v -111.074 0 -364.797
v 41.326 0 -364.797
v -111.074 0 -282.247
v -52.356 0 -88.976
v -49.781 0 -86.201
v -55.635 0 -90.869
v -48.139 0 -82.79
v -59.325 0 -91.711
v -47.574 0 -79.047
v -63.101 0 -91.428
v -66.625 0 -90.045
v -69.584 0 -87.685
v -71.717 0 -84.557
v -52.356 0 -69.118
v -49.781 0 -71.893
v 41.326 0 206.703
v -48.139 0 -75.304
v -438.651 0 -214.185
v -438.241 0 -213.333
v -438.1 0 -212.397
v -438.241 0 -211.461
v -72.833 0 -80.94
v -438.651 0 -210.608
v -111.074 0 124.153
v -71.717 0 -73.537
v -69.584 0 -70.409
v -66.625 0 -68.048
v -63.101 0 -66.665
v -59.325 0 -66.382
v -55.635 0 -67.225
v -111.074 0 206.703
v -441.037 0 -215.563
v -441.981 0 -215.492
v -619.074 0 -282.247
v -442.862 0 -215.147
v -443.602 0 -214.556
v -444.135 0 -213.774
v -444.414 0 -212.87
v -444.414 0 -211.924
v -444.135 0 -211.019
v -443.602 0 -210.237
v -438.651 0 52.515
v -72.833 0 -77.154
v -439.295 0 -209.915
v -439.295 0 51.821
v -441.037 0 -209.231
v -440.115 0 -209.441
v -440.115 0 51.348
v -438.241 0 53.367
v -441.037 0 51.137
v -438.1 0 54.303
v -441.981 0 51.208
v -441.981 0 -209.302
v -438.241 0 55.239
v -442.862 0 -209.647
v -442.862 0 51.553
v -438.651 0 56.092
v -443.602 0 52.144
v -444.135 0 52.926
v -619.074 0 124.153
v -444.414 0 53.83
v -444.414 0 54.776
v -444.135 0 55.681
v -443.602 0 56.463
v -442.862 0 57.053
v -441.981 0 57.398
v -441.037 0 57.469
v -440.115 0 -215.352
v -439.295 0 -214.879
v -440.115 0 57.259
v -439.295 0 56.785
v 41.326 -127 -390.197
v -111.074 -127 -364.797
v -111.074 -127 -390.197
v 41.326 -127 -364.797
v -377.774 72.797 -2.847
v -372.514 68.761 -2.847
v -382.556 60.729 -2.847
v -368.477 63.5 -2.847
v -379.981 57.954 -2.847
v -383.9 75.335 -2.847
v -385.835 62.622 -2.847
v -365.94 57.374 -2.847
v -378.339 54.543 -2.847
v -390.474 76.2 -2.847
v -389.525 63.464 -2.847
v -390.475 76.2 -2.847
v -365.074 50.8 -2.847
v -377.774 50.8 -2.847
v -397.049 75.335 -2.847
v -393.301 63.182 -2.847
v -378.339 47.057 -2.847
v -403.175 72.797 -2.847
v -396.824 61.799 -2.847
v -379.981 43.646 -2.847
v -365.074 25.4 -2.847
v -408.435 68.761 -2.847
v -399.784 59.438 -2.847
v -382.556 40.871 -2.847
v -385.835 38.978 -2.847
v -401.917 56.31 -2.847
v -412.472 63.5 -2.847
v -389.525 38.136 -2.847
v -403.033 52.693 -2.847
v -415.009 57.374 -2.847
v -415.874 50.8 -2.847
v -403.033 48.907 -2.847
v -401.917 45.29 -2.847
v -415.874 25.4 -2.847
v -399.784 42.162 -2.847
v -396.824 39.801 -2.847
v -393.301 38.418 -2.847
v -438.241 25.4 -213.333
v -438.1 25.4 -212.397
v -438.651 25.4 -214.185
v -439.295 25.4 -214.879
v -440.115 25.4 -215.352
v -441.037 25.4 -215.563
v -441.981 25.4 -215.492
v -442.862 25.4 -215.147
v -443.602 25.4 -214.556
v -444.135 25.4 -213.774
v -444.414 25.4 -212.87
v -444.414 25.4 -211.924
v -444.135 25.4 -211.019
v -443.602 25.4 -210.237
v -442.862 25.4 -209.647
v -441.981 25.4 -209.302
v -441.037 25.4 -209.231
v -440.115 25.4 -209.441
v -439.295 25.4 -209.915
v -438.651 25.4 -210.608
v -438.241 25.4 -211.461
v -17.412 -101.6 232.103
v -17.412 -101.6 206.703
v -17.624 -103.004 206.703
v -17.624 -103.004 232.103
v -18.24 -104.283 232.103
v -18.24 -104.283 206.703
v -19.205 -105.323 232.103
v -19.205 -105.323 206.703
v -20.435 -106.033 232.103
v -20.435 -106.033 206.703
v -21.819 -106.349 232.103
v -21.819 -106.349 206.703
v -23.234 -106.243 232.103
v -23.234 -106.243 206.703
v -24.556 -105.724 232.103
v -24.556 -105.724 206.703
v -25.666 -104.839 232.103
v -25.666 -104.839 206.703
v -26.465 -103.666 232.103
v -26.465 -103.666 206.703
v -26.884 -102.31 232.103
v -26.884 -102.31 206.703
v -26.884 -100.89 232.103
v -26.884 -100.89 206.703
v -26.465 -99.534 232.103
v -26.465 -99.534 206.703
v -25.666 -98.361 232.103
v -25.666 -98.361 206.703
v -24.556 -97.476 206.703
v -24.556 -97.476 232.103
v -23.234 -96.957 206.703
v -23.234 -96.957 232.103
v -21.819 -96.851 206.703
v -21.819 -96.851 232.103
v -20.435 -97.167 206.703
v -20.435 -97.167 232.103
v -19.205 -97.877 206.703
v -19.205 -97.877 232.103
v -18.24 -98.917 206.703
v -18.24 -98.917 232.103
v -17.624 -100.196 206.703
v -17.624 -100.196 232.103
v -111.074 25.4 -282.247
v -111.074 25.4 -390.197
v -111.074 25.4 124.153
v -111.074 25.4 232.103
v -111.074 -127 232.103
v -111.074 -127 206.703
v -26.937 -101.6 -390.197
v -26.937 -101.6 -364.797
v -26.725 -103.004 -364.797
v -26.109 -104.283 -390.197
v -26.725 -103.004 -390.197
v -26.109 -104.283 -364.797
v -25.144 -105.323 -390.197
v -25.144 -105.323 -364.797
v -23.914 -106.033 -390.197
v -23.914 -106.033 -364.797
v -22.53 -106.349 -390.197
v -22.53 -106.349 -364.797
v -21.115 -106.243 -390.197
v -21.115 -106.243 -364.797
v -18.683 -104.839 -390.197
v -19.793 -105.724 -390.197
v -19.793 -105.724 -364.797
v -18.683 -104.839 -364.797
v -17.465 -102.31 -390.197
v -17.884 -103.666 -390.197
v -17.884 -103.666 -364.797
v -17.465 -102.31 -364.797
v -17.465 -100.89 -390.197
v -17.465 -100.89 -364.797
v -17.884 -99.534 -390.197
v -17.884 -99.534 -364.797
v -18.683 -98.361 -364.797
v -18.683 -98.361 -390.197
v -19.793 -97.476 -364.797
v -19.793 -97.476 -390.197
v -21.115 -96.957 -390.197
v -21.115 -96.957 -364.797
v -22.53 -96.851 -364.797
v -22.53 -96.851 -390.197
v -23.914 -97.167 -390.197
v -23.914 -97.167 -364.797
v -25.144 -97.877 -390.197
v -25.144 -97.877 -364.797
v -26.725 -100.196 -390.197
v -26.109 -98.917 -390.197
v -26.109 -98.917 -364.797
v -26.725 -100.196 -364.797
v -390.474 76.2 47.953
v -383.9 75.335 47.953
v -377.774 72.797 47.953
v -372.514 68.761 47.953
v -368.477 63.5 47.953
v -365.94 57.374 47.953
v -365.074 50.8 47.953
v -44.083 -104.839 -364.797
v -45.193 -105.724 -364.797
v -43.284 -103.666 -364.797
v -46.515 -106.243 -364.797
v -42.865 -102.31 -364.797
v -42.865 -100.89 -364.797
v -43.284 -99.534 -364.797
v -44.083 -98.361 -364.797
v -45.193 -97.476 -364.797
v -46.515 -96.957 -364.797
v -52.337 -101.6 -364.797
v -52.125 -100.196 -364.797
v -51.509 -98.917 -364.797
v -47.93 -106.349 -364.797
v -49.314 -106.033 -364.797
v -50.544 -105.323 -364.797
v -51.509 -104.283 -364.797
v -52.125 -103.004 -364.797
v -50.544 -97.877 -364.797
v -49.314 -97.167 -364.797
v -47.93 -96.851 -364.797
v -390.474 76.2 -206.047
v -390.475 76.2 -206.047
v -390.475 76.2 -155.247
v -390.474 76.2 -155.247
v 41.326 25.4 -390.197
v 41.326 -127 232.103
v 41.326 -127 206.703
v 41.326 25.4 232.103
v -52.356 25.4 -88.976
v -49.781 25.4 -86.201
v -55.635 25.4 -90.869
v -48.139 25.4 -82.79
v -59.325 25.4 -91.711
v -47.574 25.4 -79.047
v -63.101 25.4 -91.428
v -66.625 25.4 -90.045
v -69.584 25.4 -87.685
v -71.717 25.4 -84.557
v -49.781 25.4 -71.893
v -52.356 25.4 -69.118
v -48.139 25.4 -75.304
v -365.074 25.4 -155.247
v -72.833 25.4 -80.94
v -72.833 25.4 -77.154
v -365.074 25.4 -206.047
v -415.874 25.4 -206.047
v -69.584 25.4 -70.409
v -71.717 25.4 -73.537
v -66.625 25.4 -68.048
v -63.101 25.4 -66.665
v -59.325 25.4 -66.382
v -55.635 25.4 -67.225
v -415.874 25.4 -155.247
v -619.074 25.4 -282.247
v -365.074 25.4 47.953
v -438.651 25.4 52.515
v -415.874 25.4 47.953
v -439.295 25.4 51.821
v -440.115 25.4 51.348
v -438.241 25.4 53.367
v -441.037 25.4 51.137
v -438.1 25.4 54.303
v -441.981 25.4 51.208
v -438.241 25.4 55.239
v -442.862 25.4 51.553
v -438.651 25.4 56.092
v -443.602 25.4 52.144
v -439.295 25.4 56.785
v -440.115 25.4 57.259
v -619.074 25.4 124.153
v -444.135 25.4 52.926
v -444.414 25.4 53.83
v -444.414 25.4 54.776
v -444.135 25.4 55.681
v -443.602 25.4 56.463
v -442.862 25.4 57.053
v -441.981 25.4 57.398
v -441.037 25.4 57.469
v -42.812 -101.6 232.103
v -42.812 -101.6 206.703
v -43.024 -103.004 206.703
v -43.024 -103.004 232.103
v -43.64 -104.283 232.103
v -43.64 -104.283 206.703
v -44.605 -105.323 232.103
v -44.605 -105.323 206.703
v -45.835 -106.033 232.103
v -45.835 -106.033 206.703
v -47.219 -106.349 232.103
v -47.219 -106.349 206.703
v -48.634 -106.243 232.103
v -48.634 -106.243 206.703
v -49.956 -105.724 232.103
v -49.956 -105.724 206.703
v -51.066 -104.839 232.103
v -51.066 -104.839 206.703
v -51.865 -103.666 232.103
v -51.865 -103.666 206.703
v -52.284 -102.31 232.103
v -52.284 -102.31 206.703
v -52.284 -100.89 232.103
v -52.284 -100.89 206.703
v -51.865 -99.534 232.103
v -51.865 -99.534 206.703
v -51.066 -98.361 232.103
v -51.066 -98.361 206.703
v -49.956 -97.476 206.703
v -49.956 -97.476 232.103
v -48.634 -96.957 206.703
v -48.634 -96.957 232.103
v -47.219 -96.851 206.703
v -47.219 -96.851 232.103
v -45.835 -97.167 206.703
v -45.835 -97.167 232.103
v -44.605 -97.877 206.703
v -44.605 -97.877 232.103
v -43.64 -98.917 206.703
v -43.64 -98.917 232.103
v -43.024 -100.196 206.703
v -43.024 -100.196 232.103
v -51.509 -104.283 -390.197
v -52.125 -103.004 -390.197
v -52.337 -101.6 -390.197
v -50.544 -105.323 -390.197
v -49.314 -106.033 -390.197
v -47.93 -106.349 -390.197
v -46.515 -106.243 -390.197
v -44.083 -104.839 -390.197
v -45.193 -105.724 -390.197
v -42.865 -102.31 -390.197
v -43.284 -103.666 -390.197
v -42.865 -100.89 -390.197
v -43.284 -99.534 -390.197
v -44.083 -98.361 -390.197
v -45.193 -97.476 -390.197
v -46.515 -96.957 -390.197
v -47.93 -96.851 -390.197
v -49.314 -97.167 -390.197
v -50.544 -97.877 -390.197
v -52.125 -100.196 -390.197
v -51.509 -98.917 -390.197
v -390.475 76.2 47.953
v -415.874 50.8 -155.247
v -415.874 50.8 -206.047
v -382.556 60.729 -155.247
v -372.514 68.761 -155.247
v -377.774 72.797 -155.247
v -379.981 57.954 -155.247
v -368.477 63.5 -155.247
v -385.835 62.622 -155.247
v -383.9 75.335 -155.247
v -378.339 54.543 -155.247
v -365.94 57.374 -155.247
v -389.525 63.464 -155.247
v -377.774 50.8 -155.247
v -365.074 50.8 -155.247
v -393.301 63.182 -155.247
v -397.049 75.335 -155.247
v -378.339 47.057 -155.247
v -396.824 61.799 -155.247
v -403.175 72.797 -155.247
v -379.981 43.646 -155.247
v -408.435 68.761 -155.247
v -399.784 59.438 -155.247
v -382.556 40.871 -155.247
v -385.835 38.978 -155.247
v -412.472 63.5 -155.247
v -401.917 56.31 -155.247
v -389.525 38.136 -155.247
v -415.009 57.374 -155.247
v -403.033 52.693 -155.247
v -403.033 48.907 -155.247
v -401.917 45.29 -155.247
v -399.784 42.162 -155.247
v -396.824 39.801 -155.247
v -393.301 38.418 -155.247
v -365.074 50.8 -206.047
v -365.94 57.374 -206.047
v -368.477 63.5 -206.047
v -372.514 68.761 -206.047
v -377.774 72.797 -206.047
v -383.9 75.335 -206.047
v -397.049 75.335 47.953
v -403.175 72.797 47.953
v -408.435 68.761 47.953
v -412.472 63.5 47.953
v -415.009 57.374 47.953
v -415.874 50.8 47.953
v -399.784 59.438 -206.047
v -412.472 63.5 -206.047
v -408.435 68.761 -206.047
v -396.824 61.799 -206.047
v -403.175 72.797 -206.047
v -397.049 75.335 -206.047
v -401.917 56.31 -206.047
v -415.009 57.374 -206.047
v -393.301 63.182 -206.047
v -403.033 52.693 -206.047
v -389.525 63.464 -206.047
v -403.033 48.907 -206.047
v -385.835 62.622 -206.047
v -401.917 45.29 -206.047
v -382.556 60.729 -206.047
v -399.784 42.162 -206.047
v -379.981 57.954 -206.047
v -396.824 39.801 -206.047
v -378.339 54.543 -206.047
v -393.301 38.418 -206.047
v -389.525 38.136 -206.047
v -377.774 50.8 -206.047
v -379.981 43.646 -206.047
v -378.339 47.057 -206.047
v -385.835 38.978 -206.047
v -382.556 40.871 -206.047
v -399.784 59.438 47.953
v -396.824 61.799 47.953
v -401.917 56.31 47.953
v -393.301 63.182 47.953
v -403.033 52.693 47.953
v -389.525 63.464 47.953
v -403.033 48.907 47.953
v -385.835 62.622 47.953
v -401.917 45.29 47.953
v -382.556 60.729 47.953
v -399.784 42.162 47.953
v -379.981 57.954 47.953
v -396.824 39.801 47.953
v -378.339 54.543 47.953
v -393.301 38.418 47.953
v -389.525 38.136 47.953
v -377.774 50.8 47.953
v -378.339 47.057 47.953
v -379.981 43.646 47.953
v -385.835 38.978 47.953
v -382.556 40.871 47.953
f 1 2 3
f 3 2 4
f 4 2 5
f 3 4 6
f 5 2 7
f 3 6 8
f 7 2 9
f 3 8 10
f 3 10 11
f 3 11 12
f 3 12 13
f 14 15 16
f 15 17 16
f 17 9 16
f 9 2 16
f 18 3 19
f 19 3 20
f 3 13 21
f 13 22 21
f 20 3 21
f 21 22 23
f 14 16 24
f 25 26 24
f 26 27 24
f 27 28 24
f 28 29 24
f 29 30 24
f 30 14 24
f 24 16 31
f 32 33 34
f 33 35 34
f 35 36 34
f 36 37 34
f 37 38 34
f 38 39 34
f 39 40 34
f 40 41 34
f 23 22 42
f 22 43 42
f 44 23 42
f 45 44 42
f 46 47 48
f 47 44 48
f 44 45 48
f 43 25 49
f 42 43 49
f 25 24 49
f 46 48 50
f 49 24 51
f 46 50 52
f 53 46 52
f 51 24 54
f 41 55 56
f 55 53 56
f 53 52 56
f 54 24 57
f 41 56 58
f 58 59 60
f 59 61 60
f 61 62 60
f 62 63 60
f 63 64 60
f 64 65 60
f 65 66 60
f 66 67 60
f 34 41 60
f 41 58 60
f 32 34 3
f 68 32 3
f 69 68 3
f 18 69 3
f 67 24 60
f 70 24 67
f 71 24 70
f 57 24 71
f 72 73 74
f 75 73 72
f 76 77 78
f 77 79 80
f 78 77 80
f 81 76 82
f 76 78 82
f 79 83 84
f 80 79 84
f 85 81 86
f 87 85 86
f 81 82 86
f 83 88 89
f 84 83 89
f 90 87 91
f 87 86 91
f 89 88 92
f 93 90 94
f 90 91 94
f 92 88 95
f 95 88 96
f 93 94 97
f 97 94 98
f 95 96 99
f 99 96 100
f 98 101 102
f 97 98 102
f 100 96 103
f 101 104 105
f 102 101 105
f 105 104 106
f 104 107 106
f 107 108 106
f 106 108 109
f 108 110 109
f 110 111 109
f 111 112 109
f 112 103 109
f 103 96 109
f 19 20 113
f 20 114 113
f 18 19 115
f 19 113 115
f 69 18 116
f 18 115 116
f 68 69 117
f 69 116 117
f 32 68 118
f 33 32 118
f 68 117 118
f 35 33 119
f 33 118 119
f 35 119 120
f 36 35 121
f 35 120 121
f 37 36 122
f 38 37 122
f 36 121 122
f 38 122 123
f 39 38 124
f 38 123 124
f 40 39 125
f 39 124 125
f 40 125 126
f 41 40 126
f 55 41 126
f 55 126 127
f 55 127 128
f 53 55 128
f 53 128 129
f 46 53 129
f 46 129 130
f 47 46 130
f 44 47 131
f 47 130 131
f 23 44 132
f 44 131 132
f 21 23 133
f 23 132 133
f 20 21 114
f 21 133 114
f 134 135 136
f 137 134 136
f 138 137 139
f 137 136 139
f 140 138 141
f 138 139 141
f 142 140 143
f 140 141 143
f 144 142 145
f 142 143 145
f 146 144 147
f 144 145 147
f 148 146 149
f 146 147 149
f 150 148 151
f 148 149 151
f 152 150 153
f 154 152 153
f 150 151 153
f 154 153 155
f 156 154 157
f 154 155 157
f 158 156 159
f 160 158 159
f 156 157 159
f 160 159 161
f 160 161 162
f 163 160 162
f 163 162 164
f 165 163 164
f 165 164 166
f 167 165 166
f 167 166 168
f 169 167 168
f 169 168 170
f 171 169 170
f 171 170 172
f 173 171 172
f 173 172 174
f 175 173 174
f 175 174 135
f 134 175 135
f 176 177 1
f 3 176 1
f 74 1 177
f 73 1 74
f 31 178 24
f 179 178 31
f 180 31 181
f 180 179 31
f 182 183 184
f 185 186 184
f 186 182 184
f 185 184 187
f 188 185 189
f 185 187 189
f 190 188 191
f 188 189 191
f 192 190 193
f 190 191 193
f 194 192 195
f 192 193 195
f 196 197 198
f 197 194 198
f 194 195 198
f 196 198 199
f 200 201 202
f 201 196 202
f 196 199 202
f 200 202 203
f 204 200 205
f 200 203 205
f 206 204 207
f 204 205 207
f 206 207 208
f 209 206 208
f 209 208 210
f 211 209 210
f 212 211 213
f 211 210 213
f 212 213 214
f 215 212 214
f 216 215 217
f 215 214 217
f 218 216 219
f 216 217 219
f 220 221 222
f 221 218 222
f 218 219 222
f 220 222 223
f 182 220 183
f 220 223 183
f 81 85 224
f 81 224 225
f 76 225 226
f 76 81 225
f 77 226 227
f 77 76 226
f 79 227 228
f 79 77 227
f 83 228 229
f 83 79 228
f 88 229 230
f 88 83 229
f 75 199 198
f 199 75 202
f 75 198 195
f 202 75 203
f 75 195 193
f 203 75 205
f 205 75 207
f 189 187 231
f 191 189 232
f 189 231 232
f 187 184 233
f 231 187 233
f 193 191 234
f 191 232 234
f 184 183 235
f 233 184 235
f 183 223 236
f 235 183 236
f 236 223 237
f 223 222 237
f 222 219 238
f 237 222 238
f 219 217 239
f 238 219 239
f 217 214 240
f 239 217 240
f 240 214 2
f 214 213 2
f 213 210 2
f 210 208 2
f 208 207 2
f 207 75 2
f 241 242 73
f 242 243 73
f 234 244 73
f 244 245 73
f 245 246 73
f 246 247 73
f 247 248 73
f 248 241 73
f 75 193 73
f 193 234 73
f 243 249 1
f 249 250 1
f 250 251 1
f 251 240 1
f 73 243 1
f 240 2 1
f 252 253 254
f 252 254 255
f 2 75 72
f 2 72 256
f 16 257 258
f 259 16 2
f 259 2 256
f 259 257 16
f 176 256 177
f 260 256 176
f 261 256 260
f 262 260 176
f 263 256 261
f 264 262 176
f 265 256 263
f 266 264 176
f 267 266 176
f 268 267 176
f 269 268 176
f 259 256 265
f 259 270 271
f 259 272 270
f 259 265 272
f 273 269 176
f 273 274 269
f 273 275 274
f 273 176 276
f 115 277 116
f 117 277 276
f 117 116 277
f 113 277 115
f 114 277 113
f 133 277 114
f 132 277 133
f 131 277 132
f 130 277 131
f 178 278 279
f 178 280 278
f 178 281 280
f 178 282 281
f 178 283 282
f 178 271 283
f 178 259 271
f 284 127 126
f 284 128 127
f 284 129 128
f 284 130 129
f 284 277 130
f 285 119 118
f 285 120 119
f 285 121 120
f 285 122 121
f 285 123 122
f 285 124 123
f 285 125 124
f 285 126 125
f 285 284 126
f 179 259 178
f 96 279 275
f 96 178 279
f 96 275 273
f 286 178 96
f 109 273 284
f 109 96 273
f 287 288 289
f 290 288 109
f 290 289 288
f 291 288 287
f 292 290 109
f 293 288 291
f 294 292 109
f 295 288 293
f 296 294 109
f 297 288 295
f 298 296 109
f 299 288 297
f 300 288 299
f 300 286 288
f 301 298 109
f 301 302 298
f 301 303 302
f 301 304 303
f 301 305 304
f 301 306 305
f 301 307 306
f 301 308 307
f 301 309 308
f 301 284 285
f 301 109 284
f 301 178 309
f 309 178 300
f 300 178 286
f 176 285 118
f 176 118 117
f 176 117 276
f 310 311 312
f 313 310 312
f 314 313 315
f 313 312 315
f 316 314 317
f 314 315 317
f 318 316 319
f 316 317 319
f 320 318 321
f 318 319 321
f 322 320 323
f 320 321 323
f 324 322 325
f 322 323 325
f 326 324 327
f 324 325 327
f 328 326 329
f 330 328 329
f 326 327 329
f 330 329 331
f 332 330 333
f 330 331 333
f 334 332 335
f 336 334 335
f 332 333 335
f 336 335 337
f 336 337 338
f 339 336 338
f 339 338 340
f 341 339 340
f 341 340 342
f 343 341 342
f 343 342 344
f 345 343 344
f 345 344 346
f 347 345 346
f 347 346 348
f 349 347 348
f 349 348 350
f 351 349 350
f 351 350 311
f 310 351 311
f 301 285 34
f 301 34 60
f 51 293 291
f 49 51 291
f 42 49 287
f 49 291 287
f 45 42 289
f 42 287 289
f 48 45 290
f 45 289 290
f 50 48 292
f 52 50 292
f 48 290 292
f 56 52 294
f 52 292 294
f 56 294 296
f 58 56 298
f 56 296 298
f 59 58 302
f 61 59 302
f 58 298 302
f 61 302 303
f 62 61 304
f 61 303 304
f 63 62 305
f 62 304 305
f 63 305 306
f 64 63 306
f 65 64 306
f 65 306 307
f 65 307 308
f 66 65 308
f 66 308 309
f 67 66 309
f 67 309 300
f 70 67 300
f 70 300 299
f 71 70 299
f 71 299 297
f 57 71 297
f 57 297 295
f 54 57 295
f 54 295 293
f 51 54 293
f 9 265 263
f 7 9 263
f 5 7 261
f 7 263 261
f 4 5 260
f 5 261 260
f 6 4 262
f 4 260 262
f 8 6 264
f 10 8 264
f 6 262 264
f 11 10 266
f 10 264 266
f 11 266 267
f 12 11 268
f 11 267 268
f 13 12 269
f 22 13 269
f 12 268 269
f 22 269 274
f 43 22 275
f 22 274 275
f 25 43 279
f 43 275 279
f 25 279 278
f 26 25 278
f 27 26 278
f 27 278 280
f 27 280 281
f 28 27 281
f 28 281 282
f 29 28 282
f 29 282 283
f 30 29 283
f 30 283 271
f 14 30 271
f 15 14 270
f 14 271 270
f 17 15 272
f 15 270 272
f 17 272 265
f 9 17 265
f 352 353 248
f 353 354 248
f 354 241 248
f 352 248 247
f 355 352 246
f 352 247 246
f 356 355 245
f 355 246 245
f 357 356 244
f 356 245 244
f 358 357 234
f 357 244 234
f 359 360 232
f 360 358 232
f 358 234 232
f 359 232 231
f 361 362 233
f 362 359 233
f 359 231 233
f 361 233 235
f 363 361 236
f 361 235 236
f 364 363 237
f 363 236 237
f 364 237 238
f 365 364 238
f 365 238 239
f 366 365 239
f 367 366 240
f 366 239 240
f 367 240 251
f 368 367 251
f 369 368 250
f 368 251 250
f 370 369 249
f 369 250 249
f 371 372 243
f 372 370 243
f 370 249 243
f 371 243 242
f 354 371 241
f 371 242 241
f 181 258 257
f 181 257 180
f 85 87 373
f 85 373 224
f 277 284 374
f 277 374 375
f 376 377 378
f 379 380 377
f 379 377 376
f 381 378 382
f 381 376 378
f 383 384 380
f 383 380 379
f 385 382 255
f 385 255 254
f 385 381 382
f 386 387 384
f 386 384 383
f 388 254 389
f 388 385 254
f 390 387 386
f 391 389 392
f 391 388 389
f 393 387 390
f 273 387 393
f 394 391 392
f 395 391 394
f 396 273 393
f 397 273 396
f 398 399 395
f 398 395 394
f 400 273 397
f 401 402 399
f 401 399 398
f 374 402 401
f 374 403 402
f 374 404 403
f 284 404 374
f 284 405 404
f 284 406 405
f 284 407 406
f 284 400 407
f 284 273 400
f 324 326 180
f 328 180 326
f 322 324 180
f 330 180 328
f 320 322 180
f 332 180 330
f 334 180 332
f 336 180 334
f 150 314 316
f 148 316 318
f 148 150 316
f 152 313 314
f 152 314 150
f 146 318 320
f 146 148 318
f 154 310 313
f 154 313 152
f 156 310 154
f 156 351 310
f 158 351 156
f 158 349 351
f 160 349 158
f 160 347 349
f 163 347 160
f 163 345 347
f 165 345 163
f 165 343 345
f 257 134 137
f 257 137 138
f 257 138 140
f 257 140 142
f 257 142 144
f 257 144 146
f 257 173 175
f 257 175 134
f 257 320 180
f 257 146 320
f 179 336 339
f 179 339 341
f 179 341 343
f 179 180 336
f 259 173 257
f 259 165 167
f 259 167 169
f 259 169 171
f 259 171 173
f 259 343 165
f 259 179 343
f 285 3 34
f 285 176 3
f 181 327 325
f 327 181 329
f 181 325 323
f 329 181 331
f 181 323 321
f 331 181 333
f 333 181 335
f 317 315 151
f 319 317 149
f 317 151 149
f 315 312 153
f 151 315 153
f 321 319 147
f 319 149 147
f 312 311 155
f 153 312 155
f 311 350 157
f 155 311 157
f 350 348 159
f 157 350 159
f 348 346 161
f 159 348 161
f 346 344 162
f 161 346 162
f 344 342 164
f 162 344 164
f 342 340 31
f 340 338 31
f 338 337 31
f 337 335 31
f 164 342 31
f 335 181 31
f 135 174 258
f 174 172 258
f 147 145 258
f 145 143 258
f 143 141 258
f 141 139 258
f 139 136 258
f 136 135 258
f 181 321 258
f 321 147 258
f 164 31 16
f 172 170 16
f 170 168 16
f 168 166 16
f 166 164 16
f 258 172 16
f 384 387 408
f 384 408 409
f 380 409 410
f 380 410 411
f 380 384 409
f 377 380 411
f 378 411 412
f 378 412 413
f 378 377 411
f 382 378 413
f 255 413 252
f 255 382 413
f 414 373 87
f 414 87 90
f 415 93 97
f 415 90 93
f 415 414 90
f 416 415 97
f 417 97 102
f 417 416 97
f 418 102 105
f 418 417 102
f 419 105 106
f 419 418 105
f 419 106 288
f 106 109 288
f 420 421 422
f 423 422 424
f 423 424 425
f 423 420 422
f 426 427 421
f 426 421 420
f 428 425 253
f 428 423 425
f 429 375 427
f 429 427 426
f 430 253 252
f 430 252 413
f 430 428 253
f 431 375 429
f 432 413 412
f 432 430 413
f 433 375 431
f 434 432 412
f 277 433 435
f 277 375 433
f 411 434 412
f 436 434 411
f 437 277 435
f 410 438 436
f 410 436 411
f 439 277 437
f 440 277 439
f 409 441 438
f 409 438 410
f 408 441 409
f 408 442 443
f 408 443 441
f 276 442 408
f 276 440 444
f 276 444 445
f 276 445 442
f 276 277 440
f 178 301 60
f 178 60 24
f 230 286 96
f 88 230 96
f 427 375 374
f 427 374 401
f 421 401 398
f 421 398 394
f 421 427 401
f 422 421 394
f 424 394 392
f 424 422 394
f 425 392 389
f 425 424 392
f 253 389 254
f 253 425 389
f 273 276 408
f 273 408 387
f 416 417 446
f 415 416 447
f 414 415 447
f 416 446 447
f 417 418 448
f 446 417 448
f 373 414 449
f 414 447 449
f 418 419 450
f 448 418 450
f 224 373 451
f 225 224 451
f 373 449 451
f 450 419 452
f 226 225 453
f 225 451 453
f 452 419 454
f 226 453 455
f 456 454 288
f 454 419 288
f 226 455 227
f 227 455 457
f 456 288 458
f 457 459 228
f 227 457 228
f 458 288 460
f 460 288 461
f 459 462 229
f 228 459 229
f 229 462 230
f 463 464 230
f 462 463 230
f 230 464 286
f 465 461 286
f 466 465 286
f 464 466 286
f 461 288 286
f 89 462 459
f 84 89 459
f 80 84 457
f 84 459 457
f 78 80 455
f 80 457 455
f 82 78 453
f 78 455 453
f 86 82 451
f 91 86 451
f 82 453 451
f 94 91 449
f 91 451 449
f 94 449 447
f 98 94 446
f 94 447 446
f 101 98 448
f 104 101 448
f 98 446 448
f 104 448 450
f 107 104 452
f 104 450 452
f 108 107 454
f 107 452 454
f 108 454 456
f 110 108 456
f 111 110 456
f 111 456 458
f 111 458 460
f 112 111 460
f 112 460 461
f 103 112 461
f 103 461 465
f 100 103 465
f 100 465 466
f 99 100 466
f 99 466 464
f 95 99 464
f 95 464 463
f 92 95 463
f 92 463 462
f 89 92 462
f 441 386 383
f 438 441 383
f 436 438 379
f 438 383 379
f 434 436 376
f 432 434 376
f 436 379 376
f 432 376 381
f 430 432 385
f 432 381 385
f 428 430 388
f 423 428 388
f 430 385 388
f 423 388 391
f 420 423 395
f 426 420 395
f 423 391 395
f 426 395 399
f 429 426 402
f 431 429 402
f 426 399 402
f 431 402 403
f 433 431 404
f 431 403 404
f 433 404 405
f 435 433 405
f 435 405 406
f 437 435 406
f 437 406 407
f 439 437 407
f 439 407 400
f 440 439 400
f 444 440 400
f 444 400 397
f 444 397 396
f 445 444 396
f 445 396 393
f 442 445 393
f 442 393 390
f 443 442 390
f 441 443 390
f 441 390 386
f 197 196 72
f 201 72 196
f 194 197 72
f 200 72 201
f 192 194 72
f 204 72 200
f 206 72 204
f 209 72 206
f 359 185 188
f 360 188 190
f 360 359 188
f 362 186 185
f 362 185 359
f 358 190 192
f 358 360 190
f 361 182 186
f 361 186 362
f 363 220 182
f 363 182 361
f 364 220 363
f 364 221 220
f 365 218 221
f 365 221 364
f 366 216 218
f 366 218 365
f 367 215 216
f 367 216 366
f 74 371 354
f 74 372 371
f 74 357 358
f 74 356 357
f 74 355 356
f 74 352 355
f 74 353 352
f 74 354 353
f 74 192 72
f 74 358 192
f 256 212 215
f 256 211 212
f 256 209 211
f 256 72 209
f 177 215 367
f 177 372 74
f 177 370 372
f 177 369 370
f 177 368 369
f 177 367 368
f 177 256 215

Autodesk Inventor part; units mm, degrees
ref_plane "YZ Plane" through (0, 0, 0) normal (1, 0, 0) x (0, 1, 0)
ref_plane "XZ Plane" through (0, 0, 0) normal (0, 1, 0) x (-1, 0, 0)
ref_plane "XY Plane" through (0, 0, 0) normal (0, 0, 1) x (1, 0, 0)
sketch "Sketch1" plane through (0, 0, 0) normal (0, 1, 0) x (-1, 0, 0)
  line L0 (111.0745, 206.7031) -> (-41.3255, 206.7031)
  line L1 (-41.3255, 206.7031) -> (-41.3255, -364.7969)
  line L2 (-41.3255, -364.7969) -> (111.0745, -364.7969)
  line L3 (111.0745, -364.7969) -> (111.0745, 206.7031)
  point P0 (0, 0)
  dimension "d0" = 571.5
  dimension "d1" = 152.4
extrude "Extrusion1" add sketch "Sketch1" along normal blind 25.4
sketch "Sketch2" plane through (-111.0745, 0, 206.7031) normal (0, 0, 1) x (1, 0, 0)
  line L0 (0, 0) -> (0, 25.4) projected
  line L1 (0, 25.4) -> (152.4, 25.4)
  line L2 (152.4, 25.4) -> (152.4, -127)
  line L3 (152.4, -127) -> (0, -127)
  line L4 (0, -127) -> (0, 25.4)
  line L5 (152.4, 0) -> (152.4, 25.4) projected
  line L6 (0, 0) -> (152.4, 0) projected
  line L7 (0, -127) -> (152.4, -127)
  line L8 (152.4, -127) -> (152.4, -101.6)
  line L9 (152.4, -101.6) -> (0, -101.6)
  line L10 (0, -101.6) -> (0, -127)
  circle A0 centre (63.5, -101.6) radius 4.7625
  circle A1 centre (88.9, -101.6) radius 4.7625
  line L11 (0, -127) -> (63.5, -101.6) construction
  line L12 (88.9, -101.6) -> (152.4, -127) construction
  point P0 (111.0745, 0)
  point P1 (58.7375, -101.6)
  point P2 (68.2625, -101.6)
  point P3 (84.1375, -101.6)
  point P4 (93.6625, -101.6)
  dimension "d5" = 127
  dimension "d6" = 25.4
  dimension "d7" = 25.4
  dimension "d8" = 9.525
extrude "Extrusion2" add sketch "Sketch2" along normal blind 25.4 contours L6 L2 L9 A1 A0 L4 | L0 L1 L2 L6 | L9 A0 A1 L2 L3 L4
sketch "Sketch3" plane through (41.3255, 0, -364.7969) normal (0, 0, -1) x (-1, 0, 0)
  line L0 (0, 25.4) -> (152.4, 25.4) projected
  line L1 (152.4, 0) -> (152.4, -127) projected
  line L2 (0, 25.4) -> (152.4, 25.4)
  line L3 (152.4, 25.4) -> (152.4, -127)
  line L4 (152.4, -127) -> (0, -127)
  line L5 (0, -127) -> (0, 25.4)
  circle A0 centre (63.5, -101.6) radius 4.7625 projected
  circle A1 centre (63.5, -101.6) radius 4.7625
  circle A2 centre (88.9, -101.6) radius 4.7625 projected
  circle A3 centre (88.9, -101.6) radius 4.7625
  point P0 (41.3255, 0)
  dimension "d15" = 9.525
  dimension "d16" = 9.525
extrude "Extrusion3" add sketch "Sketch3" along normal blind 25.4
sketch "Sketch4" plane through (0, 25.4, 0) normal (0, 1, 0) x (1, 0, 0)
  line L0 (-52.337, 390.1969) -> (-42.812, 390.1969) construction
  line L1 (41.3255, -232.1031) -> (-111.0745, -232.1031) construction
  line L2 (-111.0745, -232.1031) -> (-111.0745, 390.1969) construction
  line L3 (-111.0745, 79.0469) -> (41.3255, 79.0469) construction
  line L4 (41.3255, 390.1969) -> (41.3255, -232.1031) construction
  line L5 (41.3255, 390.1969) -> (-111.0745, 390.1969) construction
  circle A0 centre (-60.2745, 79.0469) radius 12.7
  point P0 (0, 0)
  dimension "d17" = 25.4
  dimension "d20" = 50.8
extrude "Extrusion4" cut sketch "Sketch4" against normal through all
sketch "Sketch5" plane through (0, 25.4, 0) normal (0, 1, 0) x (1, 0, 0)
  line L0 (-111.0745, -232.1031) -> (-111.0745, 390.1969) projected
  line L1 (-111.0745, 282.2469) -> (-619.0745, 282.2469)
  line L2 (-619.0745, 282.2469) -> (-619.0745, -124.1531)
  line L3 (-619.0745, -124.1531) -> (-111.0745, -124.1531)
  line L4 (-111.0745, -124.1531) -> (-111.0745, 282.2469)
  line L5 (41.3255, 390.1969) -> (-111.0745, 390.1969) construction
  line L6 (-619.0745, 282.2469) -> (-111.0745, 390.1969) construction
  line L7 (-111.0745, -232.1031) -> (-619.0745, -124.1531) construction
  point P0 (0, 0)
  point P1 (-111.0745, -124.1531)
  dimension "d21" = 508
  dimension "d22" = 406.4
extrude "Extrusion5" add sketch "Sketch5" against normal blind 25.4
sketch "Sketch6" plane through (0, 25.4, 0) normal (0, 1, 0) x (1, 0, 0)
  line L0 (-619.0745, -124.1531) -> (-619.0745, 282.2469) construction
  line L1 (-619.0745, 282.2469) -> (-441.2745, 282.2469) construction
  line L2 (-441.2745, 282.2469) -> (-441.2745, -124.1531) construction
  line L3 (-441.2745, -124.1531) -> (-619.0745, -124.1531) construction
  line L4 (-619.0745, -124.1531) -> (-619.0745, 282.2469) construction
  circle A0 centre (-441.2745, 212.3969) radius 3.175
  circle A1 centre (-441.2745, -54.3031) radius 3.175
  line L5 (-619.0745, -124.1531) -> (-111.0745, -124.1531) projected
  line L6 (-111.0745, 282.2469) -> (-619.0745, 282.2469) projected
  line L7 (-111.0745, -232.1031) -> (-111.0745, -124.1531) projected
  line L8 (-111.0745, 282.2469) -> (-111.0745, 390.1969) projected
  point P0 (0, 0)
  dimension "d26" = 69.85
  dimension "d27" = 69.85
  dimension "d28" = 6.35
  dimension "d33" = 330.2
  dimension "d34" = 330.2
extrude "Extrusion6" cut sketch "Sketch6" against normal through all
sketch "Sketch7" plane through (0, 25.4, 0) normal (0, 1, 0) x (1, 0, 0)
  line L0 (41.3255, -206.7031) -> (41.3255, 364.7969) construction
  line L1 (41.3255, 364.7969) -> (-365.0745, 364.7969) construction
  line L2 (-365.0745, 364.7969) -> (-365.0745, -206.7031) construction
  line L3 (-365.0745, -206.7031) -> (41.3255, -206.7031) construction
  line L4 (41.3255, -206.7031) -> (41.3255, 364.7969) construction
  line L5 (-619.0745, 282.2469) -> (-111.0745, 282.2469) construction
  line L6 (-365.0745, 282.2469) -> (-415.8745, 282.2469) construction
  line L7 (-415.8745, 282.2469) -> (-415.8745, -124.1531) construction
  line L8 (-415.8745, -124.1531) -> (-365.0745, -124.1531) construction
  line L9 (-365.0745, -124.1531) -> (-365.0745, 282.2469) construction
  line L10 (-415.8745, 282.2469) -> (-365.0745, 282.2469) construction
  line L11 (-365.0745, 282.2469) -> (-365.0745, -124.1531) construction
  line L12 (-365.0745, -124.1531) -> (-415.8745, -124.1531) construction
  line L13 (-415.8745, -124.1531) -> (-415.8745, 282.2469) construction
  line L14 (-415.8745, 206.0469) -> (-365.0745, 206.0469)
  line L15 (-365.0745, 206.0469) -> (-365.0745, 155.2469)
  line L16 (-365.0745, 155.2469) -> (-415.8745, 155.2469)
  line L17 (-415.8745, 155.2469) -> (-415.8745, 206.0469)
  line L18 (-415.8745, -47.9531) -> (-365.0745, -47.9531)
  line L19 (-365.0745, -47.9531) -> (-365.0745, 2.8469)
  line L20 (-365.0745, 2.8469) -> (-415.8745, 2.8469)
  line L21 (-415.8745, 2.8469) -> (-415.8745, -47.9531)
  point P0 (0, 0)
  dimension "d31" = 406.4
  dimension "d35" = 406.4
  dimension "d36" = 50.8
  dimension "d39" = 152.4
  dimension "d40" = 50.8
  dimension "d41" = 50.8
  dimension "d42" = 76.2
  dimension "d43" = 76.2
extrude "Extrusion7" add sketch "Sketch7" along normal blind 50.8
sketch "Sketch9" plane through (-415.8745, 25.4, 47.9531) normal (0, 0, 1) x (1, 0, 0)
  line L0 (50.8, 0) -> (50.8, 50.8) construction
  line L1 (50.8, 50.8) -> (0, 50.8) construction
  line L2 (50.8, 25.4) -> (25.4, 25.4) construction
  line L3 (25.4, 25.4) -> (25.4, 50.8) construction
  line L4 (25.4, 50.8) -> (50.8, 50.8) construction
  line L5 (50.8, 50.8) -> (50.8, 25.4) construction
  circle A0 centre (25.4, 25.4) radius 12.7
  point P0 (415.8745, -25.4)
  dimension "d44" = 25.4
extrude "Extrusion8" cut sketch "Sketch9" against normal through all
fillet "Fillet1" radius 25.4 4 edges at (-415.8745, 76.2, 22.5531) (-365.0745, 76.2, 22.5531) (-415.8745, 76.2, -180.6469) (-365.0745, 76.2, -180.6469)
equation "\"d27\" = d26"
equation "\"BendRadius\" = Thickness"
equation "\"BendReliefWidth\" = Thickness"
equation "\"BendReliefDepth\" = 0.5 * Thickness"
equation "\"CornerReliefSize\" = 4 * Thickness"
equation "\"MinimumRemnant\" = 2 * Thickness"
equation "\"TransitionRadius\" = BendRadius"
equation "\"JacobiRadiusSize\" = BendRadius"
equation "\"GapSize\" = Thickness"
equation "\"Thickness\" = 3.048"
properties part number "Steering Mount"
